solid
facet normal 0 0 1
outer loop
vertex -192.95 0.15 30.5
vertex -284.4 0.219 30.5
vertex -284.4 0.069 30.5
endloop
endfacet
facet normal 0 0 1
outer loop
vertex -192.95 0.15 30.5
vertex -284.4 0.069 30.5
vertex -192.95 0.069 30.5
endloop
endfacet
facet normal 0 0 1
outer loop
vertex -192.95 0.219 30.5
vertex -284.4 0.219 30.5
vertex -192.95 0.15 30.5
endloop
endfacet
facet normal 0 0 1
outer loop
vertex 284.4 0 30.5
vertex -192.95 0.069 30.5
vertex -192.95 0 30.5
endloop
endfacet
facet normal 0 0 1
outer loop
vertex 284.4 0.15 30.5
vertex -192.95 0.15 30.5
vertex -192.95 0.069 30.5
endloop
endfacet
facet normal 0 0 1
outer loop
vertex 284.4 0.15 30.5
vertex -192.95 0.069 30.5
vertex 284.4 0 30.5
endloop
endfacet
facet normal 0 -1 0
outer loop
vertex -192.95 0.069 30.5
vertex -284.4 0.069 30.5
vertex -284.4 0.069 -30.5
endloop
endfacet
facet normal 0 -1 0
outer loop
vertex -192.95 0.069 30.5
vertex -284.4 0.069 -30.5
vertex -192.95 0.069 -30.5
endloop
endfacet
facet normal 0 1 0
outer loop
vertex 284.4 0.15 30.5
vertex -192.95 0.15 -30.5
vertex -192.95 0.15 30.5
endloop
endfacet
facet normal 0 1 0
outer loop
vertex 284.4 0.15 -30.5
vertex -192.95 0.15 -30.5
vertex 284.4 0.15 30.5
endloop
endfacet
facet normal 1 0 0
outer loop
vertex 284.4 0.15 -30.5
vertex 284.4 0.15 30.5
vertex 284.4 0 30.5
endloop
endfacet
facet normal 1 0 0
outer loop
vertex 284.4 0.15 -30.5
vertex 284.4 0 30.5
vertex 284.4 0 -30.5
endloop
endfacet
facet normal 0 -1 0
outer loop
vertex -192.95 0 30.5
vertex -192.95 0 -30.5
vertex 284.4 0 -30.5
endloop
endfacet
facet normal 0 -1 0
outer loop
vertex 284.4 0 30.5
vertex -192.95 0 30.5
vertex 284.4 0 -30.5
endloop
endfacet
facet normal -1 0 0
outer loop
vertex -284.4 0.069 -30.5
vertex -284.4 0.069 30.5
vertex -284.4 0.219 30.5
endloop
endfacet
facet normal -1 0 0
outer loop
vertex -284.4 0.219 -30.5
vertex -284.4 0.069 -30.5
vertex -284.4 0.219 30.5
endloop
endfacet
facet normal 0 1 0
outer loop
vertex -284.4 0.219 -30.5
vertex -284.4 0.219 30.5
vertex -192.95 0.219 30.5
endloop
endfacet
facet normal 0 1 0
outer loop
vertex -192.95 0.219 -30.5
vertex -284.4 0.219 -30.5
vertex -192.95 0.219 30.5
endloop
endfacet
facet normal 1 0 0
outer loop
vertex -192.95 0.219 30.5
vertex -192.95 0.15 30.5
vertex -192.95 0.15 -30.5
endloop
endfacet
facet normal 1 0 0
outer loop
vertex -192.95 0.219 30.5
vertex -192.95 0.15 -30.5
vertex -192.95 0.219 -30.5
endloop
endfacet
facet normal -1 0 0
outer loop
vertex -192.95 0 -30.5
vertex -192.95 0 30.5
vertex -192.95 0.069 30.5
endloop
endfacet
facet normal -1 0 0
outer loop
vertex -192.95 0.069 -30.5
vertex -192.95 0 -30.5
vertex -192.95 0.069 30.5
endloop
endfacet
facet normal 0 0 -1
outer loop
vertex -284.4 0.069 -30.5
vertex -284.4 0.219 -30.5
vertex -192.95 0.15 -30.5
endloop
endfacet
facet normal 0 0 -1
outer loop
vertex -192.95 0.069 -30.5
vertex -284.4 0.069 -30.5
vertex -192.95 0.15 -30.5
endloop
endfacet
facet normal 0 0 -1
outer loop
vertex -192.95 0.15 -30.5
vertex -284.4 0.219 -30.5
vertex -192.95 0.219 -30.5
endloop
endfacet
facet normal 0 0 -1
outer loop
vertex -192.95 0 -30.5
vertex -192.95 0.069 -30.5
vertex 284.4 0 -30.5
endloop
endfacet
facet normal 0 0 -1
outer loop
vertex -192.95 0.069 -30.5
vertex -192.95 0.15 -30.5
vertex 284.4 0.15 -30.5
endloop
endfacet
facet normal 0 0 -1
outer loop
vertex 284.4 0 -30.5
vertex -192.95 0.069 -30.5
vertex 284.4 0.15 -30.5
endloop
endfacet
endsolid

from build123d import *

# Parameters (mm, degrees)
SKETCH1_W           = 528.8
SKETCH1_H           = 61
EXTRUDE1_DEPTH      = 0.15
SKETCH3_W           = 20
SKETCH3_H           = 61
BOSS_EXTRUDE2_DEPTH = 0.15
SKETCH5_W           = 91.45
SKETCH5_H           = 0.06858
BOSS_EXTRUDE4_DEPTH = 61
SKETCH6_W           = 91.45
SKETCH6_H           = 0.06858
CUT_EXTRUDE1_DEPTH  = 62


with BuildPart() as part:
    # Sketch1 → Extrude1 (new body)
    with BuildSketch(Plane(origin=(0, 0, 0), x_dir=(1, 0, 0), z_dir=(0, 1, 0))):
        Rectangle(SKETCH1_W, SKETCH1_H)
    extrude(amount=EXTRUDE1_DEPTH)

    # Sketch3 → Boss-Extrude2 (add)
    with BuildSketch(Plane(origin=(0, 0.15, 0), x_dir=(1, 0, 0), z_dir=(0, 1, 0))):
        with Locations((-274.4, 0)):
            Rectangle(SKETCH3_W, SKETCH3_H)
        with Locations((274.4, 0)):
            Rectangle(SKETCH3_W, SKETCH3_H)
    extrude(amount=-BOSS_EXTRUDE2_DEPTH)

    # Sketch5 → Boss-Extrude4 (add)
    with BuildSketch(Plane.XY.offset(30.5)):
        with Locations((-238.675, 0.18429)):
            Rectangle(SKETCH5_W, SKETCH5_H)
    extrude(amount=-BOSS_EXTRUDE4_DEPTH)

    # Sketch6 → Cut-Extrude1 (cut, through all)
    with BuildSketch(Plane.XY.offset(30.5)):
        with Locations((-238.675, 0.03429)):
            Rectangle(SKETCH6_W, SKETCH6_H)
    extrude(amount=-CUT_EXTRUDE1_DEPTH, mode=Mode.SUBTRACT)


solid = part.part
